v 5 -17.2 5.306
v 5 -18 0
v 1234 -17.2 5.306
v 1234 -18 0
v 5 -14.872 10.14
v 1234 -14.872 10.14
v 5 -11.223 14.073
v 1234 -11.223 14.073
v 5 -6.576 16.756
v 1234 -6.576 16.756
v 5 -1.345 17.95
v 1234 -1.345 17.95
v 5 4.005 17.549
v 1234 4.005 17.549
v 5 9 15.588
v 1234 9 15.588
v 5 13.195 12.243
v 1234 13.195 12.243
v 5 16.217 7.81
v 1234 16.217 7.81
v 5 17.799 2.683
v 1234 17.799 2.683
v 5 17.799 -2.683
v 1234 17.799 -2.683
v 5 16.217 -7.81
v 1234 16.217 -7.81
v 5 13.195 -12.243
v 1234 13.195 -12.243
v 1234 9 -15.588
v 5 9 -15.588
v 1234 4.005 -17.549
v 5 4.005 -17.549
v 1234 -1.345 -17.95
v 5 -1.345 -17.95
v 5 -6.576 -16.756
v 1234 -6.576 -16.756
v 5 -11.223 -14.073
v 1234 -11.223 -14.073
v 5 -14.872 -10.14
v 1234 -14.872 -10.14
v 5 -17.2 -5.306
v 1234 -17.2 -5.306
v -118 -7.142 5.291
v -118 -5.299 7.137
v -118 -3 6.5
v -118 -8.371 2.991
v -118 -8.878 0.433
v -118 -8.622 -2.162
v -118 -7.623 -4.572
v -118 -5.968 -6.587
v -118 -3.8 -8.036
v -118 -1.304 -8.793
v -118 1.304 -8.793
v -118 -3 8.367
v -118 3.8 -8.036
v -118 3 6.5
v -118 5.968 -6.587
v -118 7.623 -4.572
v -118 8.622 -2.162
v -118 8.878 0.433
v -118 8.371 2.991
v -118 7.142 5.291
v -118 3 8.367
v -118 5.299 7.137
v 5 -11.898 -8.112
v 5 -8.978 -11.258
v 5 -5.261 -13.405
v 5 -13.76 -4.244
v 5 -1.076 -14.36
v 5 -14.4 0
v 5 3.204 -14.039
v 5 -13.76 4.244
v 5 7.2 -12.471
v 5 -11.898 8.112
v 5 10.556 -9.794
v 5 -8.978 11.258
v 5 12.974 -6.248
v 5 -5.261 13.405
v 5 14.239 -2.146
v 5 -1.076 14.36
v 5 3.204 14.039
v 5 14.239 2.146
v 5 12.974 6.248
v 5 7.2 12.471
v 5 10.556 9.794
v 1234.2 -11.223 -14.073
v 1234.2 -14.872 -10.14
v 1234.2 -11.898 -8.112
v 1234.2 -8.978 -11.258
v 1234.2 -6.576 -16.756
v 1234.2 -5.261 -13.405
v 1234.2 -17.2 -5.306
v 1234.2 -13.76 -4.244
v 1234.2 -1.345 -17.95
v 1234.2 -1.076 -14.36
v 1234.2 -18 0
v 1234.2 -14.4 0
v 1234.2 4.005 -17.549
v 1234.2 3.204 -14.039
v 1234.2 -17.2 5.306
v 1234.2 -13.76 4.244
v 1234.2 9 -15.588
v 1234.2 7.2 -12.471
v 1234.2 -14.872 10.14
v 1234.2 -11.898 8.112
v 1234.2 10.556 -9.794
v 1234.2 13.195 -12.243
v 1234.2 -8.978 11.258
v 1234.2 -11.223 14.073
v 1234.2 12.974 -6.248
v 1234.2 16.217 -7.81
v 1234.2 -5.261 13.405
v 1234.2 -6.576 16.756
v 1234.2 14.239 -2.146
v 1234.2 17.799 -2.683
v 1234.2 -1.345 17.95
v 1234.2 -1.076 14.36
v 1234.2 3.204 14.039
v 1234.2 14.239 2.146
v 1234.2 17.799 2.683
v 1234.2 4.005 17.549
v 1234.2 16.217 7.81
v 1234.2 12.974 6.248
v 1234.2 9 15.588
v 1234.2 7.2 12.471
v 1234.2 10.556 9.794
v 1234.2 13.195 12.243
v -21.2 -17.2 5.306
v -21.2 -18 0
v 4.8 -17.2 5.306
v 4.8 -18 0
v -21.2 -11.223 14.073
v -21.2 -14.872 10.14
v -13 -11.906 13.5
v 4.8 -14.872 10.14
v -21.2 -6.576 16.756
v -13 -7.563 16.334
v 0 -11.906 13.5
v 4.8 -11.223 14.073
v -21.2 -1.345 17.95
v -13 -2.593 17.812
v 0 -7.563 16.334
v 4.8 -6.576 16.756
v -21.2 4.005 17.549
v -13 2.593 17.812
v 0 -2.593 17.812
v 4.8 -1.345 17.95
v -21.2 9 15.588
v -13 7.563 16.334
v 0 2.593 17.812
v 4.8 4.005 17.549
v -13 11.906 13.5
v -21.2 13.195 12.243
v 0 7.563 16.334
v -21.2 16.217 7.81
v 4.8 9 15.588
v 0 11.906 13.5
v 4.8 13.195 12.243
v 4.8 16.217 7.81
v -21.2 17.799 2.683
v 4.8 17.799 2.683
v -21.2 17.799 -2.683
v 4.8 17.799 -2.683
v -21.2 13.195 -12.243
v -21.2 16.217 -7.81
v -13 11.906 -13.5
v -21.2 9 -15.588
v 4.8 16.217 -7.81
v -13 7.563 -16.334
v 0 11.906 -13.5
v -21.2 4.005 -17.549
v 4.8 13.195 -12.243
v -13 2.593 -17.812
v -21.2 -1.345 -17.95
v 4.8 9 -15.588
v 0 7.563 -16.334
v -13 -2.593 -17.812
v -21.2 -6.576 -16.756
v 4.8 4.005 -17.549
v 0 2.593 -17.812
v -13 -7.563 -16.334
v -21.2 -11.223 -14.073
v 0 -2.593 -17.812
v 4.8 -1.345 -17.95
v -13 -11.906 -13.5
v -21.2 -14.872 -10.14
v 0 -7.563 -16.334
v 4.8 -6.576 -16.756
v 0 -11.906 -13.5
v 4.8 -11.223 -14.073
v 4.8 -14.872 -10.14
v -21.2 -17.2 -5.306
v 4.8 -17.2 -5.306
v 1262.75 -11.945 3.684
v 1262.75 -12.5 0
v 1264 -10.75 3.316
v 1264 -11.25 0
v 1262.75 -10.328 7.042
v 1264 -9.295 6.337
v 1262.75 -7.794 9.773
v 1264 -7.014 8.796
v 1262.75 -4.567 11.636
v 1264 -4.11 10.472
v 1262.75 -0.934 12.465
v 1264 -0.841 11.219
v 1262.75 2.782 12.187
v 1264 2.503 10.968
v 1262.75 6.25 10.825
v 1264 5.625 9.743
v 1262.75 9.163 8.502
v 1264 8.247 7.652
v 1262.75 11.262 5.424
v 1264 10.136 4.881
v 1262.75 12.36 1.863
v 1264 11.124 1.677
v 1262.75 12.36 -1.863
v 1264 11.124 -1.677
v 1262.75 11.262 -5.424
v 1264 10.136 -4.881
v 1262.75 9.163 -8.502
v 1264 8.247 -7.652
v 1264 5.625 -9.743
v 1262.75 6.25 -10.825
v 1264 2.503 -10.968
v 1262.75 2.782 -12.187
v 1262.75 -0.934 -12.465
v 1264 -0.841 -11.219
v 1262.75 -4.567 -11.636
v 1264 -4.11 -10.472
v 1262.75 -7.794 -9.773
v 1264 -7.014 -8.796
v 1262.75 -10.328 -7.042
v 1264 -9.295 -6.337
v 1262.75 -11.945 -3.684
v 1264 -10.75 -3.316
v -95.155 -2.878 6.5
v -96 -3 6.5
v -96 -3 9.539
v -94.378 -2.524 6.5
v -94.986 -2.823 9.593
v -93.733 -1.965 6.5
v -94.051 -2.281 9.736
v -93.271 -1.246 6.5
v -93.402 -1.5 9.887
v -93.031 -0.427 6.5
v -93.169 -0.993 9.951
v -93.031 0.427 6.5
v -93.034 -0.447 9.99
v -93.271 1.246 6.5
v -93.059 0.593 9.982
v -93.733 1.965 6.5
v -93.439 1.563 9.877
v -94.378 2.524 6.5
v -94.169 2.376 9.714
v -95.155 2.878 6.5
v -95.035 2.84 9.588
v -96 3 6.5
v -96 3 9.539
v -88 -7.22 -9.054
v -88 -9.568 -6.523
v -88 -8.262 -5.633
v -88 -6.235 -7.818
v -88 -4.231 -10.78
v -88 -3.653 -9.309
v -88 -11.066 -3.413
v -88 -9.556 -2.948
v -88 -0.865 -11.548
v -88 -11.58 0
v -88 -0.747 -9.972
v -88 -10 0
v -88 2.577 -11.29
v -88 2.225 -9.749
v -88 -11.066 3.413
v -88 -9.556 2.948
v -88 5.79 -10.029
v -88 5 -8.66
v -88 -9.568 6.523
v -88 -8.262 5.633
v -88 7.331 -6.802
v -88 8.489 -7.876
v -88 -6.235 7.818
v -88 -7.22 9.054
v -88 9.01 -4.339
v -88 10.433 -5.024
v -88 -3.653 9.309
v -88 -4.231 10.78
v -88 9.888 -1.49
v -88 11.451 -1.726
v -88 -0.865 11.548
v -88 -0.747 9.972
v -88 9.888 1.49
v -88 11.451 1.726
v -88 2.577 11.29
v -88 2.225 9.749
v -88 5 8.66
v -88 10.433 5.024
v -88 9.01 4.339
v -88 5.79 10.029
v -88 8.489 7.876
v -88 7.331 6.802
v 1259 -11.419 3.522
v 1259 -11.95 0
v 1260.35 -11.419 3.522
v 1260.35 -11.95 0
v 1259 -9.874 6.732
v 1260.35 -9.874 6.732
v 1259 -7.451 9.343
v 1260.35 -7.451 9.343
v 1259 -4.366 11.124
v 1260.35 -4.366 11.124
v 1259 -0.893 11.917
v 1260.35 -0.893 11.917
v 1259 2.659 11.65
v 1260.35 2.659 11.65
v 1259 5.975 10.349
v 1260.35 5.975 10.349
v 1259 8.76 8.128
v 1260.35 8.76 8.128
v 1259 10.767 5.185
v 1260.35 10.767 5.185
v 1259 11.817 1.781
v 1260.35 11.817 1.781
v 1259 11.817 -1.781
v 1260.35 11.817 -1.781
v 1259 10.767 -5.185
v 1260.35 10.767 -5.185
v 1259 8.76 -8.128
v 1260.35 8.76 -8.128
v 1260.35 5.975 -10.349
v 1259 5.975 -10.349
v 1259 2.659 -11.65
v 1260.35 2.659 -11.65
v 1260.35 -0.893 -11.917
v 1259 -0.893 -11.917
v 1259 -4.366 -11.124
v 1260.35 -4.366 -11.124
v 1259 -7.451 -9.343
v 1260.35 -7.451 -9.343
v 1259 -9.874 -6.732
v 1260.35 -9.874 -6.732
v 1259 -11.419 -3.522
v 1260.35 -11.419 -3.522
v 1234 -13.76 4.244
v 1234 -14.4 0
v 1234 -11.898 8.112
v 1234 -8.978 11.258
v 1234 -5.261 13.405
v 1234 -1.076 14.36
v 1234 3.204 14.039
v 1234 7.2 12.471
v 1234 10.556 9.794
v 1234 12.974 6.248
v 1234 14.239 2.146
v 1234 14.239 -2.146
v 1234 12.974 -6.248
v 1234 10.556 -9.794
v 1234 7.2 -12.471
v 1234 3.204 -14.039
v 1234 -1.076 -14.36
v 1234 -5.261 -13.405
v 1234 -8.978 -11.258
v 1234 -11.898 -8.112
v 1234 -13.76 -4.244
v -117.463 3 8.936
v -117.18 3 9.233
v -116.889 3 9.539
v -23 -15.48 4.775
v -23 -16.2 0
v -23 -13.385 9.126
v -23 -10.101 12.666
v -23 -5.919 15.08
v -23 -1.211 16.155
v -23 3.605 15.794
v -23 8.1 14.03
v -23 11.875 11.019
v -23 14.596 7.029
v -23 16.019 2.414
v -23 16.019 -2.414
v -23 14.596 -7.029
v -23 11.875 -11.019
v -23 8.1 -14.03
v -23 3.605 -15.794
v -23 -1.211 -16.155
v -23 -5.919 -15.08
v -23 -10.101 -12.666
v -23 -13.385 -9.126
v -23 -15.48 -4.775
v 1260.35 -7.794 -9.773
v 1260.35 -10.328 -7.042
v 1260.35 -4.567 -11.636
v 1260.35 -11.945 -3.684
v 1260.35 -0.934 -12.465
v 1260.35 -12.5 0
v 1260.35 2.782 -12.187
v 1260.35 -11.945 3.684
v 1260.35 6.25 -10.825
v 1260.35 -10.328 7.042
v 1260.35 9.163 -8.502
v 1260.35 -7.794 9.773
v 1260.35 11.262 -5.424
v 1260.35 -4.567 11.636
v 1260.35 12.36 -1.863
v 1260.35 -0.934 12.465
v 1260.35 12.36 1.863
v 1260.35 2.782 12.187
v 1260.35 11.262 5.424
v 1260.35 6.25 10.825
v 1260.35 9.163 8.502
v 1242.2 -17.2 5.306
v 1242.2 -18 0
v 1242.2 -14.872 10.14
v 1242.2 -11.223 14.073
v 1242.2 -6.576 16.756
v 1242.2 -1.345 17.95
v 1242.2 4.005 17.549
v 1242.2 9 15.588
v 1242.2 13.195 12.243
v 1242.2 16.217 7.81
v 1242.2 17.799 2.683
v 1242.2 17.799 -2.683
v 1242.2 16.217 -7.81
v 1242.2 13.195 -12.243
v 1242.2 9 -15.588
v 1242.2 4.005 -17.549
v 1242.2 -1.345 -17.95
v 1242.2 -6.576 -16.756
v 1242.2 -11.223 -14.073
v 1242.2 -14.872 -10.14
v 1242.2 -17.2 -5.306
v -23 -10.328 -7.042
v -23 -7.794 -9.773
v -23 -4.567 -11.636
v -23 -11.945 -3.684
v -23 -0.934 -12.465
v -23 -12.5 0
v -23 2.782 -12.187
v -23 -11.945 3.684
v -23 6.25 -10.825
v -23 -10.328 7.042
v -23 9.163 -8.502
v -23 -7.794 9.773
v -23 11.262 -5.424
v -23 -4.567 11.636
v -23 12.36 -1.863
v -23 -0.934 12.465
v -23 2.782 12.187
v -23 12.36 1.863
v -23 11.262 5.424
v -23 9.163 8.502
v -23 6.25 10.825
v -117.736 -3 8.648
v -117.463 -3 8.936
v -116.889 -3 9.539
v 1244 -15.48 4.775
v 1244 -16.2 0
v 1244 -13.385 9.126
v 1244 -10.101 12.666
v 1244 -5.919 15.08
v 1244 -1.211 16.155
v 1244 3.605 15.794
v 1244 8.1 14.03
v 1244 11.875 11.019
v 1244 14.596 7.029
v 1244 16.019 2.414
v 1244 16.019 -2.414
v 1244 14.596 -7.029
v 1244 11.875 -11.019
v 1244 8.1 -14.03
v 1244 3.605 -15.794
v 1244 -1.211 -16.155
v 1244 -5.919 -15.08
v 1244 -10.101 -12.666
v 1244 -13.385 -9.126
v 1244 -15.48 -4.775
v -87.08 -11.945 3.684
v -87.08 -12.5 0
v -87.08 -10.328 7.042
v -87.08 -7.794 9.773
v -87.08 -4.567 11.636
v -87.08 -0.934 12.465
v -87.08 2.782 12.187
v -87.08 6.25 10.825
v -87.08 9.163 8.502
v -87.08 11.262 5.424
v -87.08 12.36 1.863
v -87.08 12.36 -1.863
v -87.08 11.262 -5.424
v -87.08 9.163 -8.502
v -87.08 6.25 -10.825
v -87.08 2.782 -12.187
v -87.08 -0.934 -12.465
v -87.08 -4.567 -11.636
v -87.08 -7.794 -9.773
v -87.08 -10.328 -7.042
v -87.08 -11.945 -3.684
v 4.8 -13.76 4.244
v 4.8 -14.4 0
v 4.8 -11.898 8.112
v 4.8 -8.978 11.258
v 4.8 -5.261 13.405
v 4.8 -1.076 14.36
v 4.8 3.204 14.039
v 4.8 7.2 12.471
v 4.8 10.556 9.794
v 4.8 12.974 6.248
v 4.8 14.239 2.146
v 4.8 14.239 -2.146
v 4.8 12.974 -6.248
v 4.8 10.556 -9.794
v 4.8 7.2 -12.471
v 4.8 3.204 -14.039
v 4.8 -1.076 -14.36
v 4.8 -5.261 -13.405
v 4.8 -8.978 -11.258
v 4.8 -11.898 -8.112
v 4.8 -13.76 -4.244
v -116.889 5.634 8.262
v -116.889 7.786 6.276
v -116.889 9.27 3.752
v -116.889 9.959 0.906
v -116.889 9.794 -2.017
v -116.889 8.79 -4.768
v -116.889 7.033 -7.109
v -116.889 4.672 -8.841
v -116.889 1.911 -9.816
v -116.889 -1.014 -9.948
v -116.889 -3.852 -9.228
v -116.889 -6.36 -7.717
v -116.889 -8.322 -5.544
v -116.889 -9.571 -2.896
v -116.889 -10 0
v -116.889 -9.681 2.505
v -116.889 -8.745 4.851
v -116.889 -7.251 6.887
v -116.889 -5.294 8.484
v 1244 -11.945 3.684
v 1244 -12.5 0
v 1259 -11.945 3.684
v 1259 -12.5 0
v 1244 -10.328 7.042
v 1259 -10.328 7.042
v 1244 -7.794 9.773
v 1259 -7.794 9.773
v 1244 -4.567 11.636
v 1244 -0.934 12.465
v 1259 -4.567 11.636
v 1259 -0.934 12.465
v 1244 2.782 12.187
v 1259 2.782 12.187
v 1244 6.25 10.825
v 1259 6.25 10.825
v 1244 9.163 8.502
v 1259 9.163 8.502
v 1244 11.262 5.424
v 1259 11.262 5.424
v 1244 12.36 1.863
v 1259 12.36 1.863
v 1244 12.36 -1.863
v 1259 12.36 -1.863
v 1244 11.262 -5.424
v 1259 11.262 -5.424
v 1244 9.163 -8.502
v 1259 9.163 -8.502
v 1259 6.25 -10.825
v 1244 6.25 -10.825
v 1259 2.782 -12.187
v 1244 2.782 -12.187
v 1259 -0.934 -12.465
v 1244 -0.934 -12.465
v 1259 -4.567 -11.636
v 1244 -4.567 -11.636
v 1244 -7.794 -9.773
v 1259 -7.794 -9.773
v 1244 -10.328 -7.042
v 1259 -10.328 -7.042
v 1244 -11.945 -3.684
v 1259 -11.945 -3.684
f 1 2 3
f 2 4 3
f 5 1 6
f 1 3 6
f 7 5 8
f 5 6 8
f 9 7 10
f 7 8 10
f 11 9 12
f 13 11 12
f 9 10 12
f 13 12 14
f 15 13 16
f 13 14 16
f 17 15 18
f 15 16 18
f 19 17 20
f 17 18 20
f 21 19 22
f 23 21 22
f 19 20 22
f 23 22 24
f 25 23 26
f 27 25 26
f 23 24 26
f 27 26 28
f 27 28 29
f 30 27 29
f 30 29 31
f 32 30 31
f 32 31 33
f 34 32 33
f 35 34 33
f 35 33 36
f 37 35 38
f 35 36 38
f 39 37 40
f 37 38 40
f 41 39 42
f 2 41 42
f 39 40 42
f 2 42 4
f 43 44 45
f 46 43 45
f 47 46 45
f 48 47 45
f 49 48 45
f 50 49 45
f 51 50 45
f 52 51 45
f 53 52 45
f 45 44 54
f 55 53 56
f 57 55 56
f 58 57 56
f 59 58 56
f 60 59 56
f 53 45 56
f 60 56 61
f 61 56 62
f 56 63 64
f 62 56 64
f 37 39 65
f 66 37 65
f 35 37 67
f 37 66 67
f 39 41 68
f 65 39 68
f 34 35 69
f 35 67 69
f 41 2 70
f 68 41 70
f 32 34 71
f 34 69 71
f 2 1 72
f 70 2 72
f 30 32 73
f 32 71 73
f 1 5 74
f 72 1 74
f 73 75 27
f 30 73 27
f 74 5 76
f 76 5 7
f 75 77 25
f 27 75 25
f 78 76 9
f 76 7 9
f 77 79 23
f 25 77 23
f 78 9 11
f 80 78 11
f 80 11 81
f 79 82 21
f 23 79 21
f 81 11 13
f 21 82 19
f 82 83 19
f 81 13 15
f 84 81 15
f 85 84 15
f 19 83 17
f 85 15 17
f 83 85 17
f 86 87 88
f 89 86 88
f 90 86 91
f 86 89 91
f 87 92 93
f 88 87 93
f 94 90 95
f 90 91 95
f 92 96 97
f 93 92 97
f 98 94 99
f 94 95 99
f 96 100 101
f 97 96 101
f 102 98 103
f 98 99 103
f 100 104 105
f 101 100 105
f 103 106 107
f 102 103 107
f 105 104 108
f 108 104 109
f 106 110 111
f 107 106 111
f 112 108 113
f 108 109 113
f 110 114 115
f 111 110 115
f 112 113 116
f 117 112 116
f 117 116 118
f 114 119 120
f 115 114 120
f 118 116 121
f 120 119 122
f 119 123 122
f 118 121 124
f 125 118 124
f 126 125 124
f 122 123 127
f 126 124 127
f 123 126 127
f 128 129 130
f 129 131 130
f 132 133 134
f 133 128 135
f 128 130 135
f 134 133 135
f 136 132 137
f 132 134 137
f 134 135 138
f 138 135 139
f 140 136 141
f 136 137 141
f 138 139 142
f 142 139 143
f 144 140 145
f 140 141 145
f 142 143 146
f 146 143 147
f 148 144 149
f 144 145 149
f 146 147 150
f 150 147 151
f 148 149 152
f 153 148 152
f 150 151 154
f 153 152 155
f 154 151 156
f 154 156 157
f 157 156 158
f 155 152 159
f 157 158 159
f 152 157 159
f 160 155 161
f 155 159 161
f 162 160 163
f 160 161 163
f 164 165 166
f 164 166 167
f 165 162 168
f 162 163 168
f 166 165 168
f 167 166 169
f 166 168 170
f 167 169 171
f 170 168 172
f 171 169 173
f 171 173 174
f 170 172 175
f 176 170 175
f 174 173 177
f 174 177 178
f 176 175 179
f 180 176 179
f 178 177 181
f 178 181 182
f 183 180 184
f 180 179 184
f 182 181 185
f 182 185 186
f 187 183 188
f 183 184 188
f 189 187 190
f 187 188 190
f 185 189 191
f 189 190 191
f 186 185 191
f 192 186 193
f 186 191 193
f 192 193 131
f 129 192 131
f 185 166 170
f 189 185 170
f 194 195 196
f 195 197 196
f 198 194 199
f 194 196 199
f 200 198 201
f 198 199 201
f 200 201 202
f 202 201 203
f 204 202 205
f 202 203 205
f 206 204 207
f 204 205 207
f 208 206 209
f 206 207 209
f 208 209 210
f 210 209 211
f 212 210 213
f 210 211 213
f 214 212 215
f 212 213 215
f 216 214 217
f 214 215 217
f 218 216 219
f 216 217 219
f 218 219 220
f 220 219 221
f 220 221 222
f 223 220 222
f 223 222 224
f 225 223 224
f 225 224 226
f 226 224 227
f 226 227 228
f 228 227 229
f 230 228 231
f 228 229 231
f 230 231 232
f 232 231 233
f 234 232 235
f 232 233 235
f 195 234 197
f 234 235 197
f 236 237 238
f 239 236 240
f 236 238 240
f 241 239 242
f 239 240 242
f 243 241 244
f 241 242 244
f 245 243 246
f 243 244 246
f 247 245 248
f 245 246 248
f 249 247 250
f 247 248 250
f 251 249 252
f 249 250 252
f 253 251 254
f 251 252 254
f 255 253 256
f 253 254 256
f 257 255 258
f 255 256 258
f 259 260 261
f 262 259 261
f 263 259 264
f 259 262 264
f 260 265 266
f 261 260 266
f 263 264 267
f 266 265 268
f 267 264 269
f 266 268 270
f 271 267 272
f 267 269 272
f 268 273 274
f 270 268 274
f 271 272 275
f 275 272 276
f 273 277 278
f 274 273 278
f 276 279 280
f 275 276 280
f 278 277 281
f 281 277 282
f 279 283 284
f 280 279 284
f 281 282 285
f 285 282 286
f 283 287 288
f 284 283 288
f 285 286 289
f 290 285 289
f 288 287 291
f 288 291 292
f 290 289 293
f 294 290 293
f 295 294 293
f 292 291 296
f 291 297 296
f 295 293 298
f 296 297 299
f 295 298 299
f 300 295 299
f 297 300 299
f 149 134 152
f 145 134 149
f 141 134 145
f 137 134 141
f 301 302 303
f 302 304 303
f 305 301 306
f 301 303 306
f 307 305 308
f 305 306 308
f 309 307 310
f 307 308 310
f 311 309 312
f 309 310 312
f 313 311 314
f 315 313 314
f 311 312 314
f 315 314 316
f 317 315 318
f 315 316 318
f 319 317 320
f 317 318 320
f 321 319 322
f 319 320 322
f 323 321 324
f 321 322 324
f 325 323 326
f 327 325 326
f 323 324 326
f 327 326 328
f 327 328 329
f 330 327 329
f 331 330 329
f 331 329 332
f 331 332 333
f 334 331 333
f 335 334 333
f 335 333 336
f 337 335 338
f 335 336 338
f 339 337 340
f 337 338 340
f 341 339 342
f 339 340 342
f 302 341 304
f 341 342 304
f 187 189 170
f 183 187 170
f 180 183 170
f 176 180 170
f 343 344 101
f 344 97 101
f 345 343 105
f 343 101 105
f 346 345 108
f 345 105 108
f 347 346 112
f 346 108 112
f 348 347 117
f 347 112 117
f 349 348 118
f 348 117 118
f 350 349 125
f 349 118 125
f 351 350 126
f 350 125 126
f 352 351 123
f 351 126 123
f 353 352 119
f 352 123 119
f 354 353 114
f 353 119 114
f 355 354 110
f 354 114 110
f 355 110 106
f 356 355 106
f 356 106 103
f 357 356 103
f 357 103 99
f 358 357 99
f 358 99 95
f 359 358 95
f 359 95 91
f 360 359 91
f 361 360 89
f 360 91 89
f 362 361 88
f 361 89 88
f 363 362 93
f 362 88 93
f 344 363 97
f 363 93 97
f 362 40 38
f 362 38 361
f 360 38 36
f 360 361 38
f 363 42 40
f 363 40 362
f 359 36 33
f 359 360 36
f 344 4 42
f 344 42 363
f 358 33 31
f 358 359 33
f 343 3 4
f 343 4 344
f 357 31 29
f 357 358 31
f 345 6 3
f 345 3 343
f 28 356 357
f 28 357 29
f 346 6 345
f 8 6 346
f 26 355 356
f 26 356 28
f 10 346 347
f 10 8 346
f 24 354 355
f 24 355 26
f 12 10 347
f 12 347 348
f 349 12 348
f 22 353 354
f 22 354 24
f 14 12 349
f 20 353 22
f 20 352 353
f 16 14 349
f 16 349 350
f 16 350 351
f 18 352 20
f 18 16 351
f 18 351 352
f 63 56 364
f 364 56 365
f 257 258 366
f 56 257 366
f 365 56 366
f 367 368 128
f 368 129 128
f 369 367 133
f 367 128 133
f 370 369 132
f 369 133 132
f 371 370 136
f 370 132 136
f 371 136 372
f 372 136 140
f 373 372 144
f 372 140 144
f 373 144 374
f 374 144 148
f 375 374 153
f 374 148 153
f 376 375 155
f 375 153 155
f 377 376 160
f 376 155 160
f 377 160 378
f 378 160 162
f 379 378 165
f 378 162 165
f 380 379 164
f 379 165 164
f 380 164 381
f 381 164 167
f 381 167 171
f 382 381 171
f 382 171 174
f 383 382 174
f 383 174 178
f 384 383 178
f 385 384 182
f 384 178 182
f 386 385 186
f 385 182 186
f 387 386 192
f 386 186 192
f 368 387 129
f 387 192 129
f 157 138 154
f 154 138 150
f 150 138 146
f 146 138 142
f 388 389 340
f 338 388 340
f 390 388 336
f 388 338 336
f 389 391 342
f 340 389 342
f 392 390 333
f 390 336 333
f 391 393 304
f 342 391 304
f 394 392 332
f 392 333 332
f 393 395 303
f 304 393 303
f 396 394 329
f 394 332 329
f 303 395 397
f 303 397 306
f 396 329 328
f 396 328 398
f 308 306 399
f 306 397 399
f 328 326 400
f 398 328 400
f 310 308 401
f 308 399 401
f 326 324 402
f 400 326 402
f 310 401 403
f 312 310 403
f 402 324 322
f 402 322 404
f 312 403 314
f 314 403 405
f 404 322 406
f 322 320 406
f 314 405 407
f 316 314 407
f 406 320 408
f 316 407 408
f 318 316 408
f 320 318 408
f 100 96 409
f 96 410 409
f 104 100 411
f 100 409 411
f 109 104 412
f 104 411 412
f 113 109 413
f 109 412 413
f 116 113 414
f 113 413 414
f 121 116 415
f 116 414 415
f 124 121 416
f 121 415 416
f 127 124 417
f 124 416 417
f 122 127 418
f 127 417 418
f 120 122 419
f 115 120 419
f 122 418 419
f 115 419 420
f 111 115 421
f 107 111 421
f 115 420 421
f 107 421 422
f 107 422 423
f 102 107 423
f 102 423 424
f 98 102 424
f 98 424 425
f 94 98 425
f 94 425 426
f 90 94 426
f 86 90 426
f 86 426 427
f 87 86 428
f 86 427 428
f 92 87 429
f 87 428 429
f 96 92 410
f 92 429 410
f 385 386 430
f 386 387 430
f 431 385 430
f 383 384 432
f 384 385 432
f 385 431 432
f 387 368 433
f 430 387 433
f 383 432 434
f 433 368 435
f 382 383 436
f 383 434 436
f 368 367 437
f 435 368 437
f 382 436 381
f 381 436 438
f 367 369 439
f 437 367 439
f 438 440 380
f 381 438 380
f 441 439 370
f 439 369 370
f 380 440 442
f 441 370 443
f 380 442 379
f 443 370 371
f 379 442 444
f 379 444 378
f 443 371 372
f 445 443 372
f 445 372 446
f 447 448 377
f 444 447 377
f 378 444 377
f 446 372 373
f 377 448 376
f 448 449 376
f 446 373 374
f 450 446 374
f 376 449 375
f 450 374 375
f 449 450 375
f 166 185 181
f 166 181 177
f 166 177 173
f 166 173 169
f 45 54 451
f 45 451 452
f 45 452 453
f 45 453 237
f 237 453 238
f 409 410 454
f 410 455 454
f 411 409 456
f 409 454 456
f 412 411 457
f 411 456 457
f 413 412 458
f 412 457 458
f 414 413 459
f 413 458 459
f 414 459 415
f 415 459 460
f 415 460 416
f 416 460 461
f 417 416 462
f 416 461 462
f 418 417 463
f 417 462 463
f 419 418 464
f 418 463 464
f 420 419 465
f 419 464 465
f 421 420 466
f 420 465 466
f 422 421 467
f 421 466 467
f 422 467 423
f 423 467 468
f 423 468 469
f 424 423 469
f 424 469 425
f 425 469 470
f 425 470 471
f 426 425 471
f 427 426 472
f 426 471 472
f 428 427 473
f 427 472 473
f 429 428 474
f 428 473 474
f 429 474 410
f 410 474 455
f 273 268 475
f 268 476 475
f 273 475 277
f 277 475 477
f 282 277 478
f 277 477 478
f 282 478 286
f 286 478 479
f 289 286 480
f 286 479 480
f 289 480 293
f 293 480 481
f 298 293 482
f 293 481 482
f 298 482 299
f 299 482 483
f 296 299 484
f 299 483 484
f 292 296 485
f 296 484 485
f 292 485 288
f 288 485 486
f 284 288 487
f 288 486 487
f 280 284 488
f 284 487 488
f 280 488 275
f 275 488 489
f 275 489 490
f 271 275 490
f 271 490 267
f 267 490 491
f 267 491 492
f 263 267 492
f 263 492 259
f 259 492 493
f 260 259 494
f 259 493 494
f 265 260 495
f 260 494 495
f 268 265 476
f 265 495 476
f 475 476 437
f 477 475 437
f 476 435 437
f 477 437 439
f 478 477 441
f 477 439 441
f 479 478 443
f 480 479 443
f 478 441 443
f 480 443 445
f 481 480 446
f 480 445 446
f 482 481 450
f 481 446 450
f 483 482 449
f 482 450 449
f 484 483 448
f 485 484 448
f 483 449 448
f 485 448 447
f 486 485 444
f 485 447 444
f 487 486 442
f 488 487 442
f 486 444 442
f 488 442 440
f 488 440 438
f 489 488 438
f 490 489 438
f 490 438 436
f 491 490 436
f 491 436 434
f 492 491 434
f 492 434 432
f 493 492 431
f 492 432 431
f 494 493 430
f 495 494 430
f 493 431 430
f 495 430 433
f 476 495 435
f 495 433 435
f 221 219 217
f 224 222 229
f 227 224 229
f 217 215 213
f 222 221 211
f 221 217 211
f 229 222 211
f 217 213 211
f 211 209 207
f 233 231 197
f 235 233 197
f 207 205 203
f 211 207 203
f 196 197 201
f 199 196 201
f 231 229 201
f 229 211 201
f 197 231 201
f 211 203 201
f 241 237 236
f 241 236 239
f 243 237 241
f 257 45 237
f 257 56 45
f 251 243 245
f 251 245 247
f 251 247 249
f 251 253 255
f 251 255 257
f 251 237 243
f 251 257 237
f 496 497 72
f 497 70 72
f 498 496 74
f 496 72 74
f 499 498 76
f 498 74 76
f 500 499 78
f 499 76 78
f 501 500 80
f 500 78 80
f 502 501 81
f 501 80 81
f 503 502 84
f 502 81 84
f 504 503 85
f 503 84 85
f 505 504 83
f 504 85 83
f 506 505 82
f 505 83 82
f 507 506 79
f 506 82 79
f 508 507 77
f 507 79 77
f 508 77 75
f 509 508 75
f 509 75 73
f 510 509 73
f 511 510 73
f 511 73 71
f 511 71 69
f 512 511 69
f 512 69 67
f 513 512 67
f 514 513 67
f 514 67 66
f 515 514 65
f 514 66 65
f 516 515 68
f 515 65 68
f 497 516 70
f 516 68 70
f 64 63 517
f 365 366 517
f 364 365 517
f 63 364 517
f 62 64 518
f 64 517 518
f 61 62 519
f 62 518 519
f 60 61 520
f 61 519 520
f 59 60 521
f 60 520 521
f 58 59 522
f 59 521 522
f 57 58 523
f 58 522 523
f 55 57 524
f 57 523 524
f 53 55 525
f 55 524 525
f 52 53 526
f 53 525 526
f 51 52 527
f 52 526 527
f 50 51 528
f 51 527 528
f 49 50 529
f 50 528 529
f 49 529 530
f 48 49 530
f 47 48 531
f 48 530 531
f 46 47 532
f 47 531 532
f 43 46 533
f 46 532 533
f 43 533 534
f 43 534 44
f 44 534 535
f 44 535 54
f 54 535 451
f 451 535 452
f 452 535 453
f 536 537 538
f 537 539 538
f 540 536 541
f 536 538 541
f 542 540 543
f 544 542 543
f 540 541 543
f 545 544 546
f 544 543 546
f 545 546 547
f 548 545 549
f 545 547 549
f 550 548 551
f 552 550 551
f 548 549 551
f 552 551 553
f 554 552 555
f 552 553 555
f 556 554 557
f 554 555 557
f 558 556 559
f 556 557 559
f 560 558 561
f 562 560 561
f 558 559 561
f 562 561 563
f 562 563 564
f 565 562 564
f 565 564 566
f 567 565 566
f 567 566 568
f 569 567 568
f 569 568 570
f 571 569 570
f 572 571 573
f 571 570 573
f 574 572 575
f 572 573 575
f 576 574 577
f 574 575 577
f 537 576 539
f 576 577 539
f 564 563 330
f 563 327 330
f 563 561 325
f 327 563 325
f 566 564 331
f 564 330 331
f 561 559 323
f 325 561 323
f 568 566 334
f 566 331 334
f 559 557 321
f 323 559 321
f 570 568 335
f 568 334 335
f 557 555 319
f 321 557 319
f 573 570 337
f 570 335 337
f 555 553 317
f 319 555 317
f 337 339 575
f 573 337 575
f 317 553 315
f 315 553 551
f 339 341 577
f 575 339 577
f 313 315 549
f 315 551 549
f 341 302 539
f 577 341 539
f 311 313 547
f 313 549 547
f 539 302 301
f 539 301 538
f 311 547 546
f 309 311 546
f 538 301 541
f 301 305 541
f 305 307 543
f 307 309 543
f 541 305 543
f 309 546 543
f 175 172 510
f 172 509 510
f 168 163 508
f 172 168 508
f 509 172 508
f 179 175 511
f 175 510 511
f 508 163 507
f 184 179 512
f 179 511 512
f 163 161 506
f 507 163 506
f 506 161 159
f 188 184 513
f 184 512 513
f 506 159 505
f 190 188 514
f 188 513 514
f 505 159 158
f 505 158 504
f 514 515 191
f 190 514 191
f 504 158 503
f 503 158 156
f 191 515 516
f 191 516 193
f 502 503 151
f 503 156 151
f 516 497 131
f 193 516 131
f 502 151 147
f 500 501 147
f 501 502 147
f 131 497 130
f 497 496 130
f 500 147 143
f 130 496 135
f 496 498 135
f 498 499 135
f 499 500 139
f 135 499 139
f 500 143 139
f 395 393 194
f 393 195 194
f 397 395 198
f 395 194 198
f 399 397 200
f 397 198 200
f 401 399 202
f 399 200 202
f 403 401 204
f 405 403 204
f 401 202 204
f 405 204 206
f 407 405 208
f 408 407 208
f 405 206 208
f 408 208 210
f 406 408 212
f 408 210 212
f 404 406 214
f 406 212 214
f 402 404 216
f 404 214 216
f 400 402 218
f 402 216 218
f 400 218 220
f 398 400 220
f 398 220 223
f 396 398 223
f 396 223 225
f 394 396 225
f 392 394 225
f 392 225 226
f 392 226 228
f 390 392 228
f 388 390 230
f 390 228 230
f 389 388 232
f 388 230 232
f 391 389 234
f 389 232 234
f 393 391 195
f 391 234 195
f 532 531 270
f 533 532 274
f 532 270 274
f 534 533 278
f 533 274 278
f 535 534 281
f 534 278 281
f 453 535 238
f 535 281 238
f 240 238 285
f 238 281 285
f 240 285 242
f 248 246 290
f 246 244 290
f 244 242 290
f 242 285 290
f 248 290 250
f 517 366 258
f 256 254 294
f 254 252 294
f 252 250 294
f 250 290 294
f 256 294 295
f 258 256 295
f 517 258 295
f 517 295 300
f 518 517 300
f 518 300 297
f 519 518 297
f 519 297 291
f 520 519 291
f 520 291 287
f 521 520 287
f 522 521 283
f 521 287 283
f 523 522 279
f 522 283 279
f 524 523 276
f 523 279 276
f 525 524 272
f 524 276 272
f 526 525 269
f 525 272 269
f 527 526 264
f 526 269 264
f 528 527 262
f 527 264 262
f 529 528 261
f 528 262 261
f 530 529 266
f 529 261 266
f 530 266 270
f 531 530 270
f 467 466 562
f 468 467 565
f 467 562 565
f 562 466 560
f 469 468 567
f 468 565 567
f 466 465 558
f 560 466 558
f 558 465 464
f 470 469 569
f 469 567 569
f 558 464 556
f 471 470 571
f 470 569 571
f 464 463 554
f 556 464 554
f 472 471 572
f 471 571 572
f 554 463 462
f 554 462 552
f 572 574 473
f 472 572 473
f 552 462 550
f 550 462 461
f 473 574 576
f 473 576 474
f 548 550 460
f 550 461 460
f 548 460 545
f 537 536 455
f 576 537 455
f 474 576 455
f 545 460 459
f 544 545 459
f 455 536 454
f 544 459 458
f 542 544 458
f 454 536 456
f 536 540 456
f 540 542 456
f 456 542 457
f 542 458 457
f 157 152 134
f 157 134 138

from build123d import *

# Parameters (mm, degrees)
SKETCH1_W          = 1229
SKETCH1_H          = 18
SKETCH3_W          = 13
SKETCH3_H          = 36
CUT_EXTRUDE1_DEPTH = 9
SKETCH4_W          = 13
SKETCH4_H          = 36
CUT_EXTRUDE2_DEPTH = 9
CUT_EXTRUDE3_DEPTH = 3.5


with BuildPart() as part:
    # Sketch1 → Revolve1 (revolve)
    with BuildSketch(Plane.XY, mode=Mode.PRIVATE) as revolve1_sk:
        with Locations((619.5, 9)):
            Rectangle(SKETCH1_W, SKETCH1_H)
    revolve(revolve1_sk.sketch.rotate(Axis((1234, 0, 0), (-1, 0, 0)), 180), axis=Axis((1234, 0, 0), (-1, 0, 0)))

    # Sketch2 → Revolve2 (revolve)
    with BuildSketch(Plane.XY, mode=Mode.PRIVATE) as revolve2_sk:
        Polygon((-118, 0), (-118, 8.888888889), (-116.888888889, 10), (-88, 10), (-88, 11.58), (-87.08, 12.5), (-23, 12.5), (-23, 16.2), (-21.2, 18), (4.8, 18), (4.8, 14.4), (5, 14.4), (5, 0), align=None)
    revolve(revolve2_sk.sketch.rotate(Axis((5, 0, 0), (-1, 0, 0)), 180), axis=Axis((5, 0, 0), (-1, 0, 0)))

    # Sketch3 → Cut-Extrude1 (cut)
    with BuildSketch(Plane.XY.offset(13.5)):
        with Locations((-6.5, 0)):
            Rectangle(SKETCH3_W, SKETCH3_H)
    extrude(amount=CUT_EXTRUDE1_DEPTH, mode=Mode.SUBTRACT)

    # Sketch4 → Cut-Extrude2 (cut)
    with BuildSketch(Plane.XY.offset(-13.5)):
        with Locations((-6.5, 0)):
            Rectangle(SKETCH4_W, SKETCH4_H)
    extrude(amount=-CUT_EXTRUDE2_DEPTH, mode=Mode.SUBTRACT)

    # Sketch5 → Cut-Extrude3 (cut)
    with BuildSketch(Plane.XY.offset(10)):
        with BuildLine():
            Line((-118, -3), (-96, -3))
            ThreePointArc((-96, -3), (-93, 0), (-96, 3))
            Line((-96, 3), (-118, 3))
            Line((-118, 3), (-118, -3))
        make_face()
    extrude(amount=-CUT_EXTRUDE3_DEPTH, mode=Mode.SUBTRACT)

    # Sketch6 → Revolve3 (revolve)
    with BuildSketch(Plane.XY, mode=Mode.PRIVATE) as revolve3_sk:
        Polygon((1234, 0), (1234, 14.4), (1234.2, 14.4), (1234.2, 18), (1242.2, 18), (1244, 16.2), (1244, 12.5), (1259, 12.5), (1259, 11.95), (1260.35, 11.95), (1260.35, 12.5), (1262.75, 12.5), (1264, 11.25), (1264, 0), align=None)
    revolve(revolve3_sk.sketch.rotate(Axis((1264, 0, 0), (-1, 0, 0)), 180), axis=Axis((1264, 0, 0), (-1, 0, 0)))


solid = part.part
